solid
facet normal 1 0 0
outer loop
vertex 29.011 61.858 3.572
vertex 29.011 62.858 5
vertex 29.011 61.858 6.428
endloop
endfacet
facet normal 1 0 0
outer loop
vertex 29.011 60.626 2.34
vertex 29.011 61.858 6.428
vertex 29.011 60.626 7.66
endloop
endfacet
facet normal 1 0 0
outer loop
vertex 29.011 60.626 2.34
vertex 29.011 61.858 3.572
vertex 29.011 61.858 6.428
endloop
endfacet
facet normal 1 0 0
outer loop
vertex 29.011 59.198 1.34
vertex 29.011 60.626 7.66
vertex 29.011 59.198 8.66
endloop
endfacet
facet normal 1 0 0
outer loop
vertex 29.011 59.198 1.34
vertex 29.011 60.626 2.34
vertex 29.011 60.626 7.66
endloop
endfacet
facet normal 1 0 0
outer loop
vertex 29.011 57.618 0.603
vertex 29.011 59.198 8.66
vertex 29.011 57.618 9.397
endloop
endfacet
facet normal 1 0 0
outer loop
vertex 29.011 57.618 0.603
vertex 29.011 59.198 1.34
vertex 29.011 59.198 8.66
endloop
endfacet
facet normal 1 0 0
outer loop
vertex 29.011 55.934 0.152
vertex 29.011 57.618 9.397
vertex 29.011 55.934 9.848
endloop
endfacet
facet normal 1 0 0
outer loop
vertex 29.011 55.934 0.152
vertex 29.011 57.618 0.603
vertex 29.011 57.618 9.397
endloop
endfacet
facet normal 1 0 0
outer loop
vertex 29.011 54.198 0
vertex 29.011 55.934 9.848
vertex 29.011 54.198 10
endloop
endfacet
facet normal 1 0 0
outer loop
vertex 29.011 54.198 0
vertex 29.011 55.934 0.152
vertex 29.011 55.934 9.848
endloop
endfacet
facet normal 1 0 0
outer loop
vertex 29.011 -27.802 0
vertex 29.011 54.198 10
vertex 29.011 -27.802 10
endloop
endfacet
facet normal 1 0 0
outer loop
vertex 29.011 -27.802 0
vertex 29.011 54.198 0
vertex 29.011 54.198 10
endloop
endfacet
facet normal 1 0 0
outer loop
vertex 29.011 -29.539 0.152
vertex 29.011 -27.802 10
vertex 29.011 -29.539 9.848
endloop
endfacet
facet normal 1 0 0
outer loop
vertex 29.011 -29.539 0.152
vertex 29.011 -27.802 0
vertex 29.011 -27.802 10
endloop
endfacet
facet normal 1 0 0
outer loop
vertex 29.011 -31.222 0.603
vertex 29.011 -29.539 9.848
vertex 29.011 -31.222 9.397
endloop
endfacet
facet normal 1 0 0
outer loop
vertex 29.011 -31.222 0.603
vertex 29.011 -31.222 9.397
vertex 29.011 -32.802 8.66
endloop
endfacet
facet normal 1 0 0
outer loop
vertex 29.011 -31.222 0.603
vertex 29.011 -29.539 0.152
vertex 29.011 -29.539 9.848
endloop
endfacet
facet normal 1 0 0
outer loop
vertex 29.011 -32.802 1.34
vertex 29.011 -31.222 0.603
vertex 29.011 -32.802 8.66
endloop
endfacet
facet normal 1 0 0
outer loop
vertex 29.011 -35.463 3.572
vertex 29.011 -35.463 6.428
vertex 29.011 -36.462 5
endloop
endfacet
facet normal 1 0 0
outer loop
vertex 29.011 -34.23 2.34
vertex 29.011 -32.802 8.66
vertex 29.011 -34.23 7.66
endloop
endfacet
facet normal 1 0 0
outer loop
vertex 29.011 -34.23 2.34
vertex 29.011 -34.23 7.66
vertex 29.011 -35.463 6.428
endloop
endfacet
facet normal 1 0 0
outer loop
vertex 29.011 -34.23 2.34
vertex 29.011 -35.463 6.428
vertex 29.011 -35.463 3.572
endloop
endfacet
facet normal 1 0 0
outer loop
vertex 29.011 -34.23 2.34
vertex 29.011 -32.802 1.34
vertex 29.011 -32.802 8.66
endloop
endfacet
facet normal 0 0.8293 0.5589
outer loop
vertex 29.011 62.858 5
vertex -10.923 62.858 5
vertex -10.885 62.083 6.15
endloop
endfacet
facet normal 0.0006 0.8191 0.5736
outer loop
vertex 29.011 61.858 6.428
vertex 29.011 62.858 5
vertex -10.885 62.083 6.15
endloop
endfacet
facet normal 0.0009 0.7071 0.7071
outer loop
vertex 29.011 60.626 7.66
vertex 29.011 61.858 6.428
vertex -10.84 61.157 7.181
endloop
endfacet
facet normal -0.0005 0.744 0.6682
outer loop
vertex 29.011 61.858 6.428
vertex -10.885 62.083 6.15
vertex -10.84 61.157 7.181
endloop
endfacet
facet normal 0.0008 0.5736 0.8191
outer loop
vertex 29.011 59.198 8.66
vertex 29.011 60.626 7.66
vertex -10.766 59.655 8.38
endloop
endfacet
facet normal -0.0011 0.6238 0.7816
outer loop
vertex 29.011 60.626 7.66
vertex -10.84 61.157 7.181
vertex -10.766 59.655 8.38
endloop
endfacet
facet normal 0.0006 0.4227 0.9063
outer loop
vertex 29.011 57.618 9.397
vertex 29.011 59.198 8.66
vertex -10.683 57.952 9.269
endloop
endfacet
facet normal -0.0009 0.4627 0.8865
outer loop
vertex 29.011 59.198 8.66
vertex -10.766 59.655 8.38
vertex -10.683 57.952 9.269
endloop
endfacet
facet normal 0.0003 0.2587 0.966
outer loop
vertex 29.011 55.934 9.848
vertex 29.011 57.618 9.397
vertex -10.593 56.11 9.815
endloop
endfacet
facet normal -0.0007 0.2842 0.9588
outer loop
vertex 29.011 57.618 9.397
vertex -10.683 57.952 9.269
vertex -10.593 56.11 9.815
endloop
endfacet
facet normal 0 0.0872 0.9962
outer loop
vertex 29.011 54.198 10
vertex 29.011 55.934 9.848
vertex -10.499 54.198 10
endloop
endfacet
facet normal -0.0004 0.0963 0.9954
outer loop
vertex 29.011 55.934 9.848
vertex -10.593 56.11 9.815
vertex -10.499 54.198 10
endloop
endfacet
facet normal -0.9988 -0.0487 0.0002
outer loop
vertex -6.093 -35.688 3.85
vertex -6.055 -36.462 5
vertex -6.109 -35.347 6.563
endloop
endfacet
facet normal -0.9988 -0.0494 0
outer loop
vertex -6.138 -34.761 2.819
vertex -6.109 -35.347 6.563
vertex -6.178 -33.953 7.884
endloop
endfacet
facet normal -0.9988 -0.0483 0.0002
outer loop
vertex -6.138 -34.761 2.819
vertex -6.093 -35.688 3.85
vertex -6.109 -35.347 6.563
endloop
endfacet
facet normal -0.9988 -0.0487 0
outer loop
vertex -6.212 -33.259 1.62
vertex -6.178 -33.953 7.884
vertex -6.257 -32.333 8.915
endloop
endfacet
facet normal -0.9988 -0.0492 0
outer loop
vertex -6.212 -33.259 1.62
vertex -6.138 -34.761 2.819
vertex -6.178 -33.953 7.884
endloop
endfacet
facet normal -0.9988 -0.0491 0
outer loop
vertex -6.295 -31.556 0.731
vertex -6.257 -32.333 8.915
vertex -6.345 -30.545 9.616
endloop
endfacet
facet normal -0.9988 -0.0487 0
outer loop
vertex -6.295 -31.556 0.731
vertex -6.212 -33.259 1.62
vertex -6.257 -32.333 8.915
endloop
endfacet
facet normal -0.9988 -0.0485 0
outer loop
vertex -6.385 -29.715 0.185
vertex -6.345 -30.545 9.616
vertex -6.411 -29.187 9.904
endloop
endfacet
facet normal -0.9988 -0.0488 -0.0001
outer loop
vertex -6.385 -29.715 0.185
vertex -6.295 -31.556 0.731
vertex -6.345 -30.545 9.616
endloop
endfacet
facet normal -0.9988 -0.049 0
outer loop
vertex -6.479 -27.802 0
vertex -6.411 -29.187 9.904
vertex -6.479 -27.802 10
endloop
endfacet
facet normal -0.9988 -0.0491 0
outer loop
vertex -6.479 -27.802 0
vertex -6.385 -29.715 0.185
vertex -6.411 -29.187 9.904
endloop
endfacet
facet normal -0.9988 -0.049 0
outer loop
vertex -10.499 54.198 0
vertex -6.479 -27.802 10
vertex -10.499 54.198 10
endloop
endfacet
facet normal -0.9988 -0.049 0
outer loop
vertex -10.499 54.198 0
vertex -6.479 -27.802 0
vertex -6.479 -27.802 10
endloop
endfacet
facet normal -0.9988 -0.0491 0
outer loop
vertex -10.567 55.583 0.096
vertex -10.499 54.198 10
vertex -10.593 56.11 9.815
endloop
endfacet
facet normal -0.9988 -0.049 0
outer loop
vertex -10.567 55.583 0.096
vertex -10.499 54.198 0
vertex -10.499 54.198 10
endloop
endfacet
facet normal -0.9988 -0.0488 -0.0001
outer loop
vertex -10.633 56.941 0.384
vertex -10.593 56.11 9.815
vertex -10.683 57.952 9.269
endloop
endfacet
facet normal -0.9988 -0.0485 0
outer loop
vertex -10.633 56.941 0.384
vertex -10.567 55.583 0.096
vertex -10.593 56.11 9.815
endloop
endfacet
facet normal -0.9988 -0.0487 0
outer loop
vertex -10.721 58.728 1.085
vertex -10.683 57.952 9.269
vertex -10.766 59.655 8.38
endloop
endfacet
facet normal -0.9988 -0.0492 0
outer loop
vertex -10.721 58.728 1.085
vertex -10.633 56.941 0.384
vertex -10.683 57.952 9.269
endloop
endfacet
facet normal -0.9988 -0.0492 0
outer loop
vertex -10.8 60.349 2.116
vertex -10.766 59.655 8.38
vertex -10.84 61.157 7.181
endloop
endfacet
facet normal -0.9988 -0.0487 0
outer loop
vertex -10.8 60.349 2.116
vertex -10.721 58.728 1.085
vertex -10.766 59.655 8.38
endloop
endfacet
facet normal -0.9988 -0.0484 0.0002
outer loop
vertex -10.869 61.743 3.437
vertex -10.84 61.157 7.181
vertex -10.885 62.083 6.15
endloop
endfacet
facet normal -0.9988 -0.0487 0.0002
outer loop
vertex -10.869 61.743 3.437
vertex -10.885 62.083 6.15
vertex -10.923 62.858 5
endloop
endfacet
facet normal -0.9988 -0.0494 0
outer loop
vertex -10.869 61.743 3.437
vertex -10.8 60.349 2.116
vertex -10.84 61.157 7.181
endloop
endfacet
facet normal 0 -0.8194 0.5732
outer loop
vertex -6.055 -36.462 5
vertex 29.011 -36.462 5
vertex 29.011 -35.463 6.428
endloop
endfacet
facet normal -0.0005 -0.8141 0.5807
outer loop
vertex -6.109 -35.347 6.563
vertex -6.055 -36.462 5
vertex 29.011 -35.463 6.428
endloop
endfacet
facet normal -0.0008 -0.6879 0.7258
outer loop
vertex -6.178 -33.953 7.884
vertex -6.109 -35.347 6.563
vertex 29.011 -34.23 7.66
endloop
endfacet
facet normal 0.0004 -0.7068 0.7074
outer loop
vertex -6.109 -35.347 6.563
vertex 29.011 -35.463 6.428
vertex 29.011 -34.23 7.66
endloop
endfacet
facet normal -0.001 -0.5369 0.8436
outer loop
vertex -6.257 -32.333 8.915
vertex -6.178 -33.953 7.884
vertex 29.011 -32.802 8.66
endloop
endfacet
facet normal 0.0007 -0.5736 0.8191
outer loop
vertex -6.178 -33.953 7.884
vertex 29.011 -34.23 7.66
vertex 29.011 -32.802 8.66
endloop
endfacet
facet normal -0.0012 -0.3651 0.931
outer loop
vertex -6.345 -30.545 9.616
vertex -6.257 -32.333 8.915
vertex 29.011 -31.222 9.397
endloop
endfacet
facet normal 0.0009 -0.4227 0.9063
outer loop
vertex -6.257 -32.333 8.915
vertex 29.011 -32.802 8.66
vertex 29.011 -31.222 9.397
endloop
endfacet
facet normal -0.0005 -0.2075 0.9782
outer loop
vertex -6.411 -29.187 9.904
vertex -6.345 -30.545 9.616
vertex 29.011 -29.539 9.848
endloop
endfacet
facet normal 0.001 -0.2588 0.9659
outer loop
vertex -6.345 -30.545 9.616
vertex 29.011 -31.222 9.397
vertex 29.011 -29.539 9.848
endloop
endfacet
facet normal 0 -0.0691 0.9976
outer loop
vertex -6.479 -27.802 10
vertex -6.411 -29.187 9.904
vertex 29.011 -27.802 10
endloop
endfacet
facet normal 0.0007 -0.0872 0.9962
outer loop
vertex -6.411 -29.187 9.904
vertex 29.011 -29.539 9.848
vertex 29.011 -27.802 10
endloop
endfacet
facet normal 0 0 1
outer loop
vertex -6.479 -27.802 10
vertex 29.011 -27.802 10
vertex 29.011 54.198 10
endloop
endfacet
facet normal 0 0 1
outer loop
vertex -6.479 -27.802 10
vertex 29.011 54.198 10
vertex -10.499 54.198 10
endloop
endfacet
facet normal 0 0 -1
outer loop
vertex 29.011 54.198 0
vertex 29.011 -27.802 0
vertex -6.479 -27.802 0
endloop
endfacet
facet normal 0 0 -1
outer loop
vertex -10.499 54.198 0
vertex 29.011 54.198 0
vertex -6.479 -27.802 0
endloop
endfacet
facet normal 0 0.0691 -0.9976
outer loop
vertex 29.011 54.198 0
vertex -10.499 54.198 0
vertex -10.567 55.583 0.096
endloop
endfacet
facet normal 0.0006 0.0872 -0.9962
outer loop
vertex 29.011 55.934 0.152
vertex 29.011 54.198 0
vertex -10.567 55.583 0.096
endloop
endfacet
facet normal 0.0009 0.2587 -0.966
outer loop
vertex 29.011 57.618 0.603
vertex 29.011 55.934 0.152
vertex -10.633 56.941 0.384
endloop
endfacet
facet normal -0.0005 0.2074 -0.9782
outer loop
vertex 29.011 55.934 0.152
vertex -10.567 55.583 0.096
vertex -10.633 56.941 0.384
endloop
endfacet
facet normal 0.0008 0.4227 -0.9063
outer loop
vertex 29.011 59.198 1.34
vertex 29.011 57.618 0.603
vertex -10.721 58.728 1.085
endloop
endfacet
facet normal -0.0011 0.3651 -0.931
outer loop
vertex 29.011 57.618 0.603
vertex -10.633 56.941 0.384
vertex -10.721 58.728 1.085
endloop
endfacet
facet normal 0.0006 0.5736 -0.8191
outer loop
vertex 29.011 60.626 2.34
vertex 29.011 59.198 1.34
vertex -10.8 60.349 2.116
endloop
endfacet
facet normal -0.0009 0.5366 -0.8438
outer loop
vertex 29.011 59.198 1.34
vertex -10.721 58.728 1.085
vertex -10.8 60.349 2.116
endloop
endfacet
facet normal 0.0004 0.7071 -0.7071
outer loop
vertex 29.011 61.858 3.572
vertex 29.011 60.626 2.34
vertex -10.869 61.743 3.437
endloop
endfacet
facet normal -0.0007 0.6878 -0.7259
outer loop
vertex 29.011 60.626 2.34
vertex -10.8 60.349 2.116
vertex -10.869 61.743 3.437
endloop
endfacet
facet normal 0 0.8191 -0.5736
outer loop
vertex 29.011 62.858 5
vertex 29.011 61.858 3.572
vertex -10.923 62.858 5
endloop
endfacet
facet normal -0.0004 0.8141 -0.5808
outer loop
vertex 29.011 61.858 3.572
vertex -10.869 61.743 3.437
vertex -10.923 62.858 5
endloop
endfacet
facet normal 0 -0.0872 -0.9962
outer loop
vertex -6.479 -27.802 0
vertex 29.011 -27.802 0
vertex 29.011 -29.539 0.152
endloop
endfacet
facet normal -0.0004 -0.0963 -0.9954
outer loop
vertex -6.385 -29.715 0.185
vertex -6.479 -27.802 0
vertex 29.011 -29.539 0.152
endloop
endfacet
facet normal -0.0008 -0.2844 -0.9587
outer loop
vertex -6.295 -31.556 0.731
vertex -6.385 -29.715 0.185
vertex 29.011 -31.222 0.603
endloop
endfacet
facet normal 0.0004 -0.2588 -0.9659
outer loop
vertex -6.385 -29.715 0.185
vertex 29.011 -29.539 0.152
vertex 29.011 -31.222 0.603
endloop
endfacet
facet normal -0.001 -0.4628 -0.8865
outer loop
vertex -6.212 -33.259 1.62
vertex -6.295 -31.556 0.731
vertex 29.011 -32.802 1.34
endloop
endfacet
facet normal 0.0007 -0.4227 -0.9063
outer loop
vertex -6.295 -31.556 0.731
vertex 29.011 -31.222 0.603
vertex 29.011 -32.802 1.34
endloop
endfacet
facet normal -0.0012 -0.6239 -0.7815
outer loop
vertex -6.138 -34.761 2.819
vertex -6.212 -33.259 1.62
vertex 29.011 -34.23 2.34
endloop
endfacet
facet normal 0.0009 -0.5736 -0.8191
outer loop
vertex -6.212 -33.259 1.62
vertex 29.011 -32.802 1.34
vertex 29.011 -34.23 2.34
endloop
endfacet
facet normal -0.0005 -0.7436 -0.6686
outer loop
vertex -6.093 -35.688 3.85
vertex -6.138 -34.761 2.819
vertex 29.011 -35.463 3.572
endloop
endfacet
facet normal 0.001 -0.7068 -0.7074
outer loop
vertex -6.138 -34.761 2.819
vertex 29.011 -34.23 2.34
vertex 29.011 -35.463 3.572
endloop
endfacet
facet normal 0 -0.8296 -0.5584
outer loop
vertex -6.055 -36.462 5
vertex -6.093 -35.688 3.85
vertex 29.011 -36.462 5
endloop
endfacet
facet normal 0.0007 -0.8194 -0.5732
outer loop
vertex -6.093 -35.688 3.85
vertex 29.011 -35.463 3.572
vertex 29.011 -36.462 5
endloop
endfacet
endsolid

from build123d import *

# Parameters (mm, degrees)
BOSS_EXTRUDE1_DEPTH = 10
FILLET1_R           = 10
FILLET2_R           = 10


with BuildPart() as part:
    # Sketch2 → Boss-Extrude1 (new body)
    with BuildSketch(Plane.XY):
        Polygon((-10.989010989, 64.197802198), (29.010989011, 64.197802198), (29.010989011, -37.802197802), (-5.989010989, -37.802197802), align=None)
    extrude(amount=BOSS_EXTRUDE1_DEPTH)

    # Fillet1
    # the kernel refuses this fillet: 10 mm, written as the material it takes off along each edge
    with BuildSketch(Plane(origin=(-35.989010989, 64.197802198, 0), x_dir=(0, 0, 1), z_dir=(1, 0, 0))) as fillet1_piece_1:
        with BuildLine():
            CenterArc((FILLET1_R, FILLET1_R), FILLET1_R, 180, 90)
            Line((0, FILLET1_R), (0, 0))
            Line((0, 0), (FILLET1_R, 0))
        make_face()
    extrude(amount=90, mode=Mode.SUBTRACT)
    with BuildSketch(Plane(origin=(-35.989010989, 64.197802198, 10), x_dir=(0, 0, -1), z_dir=(1, 0, 0))) as fillet1_piece_2:
        with BuildLine():
            CenterArc((FILLET1_R, -FILLET1_R), FILLET1_R, 90, 90)
            Line((0, -FILLET1_R), (0, 0))
            Line((0, 0), (FILLET1_R, 0))
        make_face()
    extrude(amount=90, mode=Mode.SUBTRACT)

    # Fillet2
    # the kernel refuses this fillet: 10 mm, written as the material it takes off along each edge
    with BuildSketch(Plane(origin=(54.010989011, -37.802197802, 0), x_dir=(0, 0, 1), z_dir=(-1, 0, 0)), Plane(origin=(54.010989011, -37.802197802, 10), x_dir=(0, 1, 0), z_dir=(-1, 0, 0))) as fillet2_piece_1:
        with BuildLine():
            CenterArc((FILLET2_R, FILLET2_R), FILLET2_R, 180, 90)
            Line((0, FILLET2_R), (0, 0))
            Line((0, 0), (FILLET2_R, 0))
        make_face()
    extrude(amount=85, mode=Mode.SUBTRACT)


solid = part.part
